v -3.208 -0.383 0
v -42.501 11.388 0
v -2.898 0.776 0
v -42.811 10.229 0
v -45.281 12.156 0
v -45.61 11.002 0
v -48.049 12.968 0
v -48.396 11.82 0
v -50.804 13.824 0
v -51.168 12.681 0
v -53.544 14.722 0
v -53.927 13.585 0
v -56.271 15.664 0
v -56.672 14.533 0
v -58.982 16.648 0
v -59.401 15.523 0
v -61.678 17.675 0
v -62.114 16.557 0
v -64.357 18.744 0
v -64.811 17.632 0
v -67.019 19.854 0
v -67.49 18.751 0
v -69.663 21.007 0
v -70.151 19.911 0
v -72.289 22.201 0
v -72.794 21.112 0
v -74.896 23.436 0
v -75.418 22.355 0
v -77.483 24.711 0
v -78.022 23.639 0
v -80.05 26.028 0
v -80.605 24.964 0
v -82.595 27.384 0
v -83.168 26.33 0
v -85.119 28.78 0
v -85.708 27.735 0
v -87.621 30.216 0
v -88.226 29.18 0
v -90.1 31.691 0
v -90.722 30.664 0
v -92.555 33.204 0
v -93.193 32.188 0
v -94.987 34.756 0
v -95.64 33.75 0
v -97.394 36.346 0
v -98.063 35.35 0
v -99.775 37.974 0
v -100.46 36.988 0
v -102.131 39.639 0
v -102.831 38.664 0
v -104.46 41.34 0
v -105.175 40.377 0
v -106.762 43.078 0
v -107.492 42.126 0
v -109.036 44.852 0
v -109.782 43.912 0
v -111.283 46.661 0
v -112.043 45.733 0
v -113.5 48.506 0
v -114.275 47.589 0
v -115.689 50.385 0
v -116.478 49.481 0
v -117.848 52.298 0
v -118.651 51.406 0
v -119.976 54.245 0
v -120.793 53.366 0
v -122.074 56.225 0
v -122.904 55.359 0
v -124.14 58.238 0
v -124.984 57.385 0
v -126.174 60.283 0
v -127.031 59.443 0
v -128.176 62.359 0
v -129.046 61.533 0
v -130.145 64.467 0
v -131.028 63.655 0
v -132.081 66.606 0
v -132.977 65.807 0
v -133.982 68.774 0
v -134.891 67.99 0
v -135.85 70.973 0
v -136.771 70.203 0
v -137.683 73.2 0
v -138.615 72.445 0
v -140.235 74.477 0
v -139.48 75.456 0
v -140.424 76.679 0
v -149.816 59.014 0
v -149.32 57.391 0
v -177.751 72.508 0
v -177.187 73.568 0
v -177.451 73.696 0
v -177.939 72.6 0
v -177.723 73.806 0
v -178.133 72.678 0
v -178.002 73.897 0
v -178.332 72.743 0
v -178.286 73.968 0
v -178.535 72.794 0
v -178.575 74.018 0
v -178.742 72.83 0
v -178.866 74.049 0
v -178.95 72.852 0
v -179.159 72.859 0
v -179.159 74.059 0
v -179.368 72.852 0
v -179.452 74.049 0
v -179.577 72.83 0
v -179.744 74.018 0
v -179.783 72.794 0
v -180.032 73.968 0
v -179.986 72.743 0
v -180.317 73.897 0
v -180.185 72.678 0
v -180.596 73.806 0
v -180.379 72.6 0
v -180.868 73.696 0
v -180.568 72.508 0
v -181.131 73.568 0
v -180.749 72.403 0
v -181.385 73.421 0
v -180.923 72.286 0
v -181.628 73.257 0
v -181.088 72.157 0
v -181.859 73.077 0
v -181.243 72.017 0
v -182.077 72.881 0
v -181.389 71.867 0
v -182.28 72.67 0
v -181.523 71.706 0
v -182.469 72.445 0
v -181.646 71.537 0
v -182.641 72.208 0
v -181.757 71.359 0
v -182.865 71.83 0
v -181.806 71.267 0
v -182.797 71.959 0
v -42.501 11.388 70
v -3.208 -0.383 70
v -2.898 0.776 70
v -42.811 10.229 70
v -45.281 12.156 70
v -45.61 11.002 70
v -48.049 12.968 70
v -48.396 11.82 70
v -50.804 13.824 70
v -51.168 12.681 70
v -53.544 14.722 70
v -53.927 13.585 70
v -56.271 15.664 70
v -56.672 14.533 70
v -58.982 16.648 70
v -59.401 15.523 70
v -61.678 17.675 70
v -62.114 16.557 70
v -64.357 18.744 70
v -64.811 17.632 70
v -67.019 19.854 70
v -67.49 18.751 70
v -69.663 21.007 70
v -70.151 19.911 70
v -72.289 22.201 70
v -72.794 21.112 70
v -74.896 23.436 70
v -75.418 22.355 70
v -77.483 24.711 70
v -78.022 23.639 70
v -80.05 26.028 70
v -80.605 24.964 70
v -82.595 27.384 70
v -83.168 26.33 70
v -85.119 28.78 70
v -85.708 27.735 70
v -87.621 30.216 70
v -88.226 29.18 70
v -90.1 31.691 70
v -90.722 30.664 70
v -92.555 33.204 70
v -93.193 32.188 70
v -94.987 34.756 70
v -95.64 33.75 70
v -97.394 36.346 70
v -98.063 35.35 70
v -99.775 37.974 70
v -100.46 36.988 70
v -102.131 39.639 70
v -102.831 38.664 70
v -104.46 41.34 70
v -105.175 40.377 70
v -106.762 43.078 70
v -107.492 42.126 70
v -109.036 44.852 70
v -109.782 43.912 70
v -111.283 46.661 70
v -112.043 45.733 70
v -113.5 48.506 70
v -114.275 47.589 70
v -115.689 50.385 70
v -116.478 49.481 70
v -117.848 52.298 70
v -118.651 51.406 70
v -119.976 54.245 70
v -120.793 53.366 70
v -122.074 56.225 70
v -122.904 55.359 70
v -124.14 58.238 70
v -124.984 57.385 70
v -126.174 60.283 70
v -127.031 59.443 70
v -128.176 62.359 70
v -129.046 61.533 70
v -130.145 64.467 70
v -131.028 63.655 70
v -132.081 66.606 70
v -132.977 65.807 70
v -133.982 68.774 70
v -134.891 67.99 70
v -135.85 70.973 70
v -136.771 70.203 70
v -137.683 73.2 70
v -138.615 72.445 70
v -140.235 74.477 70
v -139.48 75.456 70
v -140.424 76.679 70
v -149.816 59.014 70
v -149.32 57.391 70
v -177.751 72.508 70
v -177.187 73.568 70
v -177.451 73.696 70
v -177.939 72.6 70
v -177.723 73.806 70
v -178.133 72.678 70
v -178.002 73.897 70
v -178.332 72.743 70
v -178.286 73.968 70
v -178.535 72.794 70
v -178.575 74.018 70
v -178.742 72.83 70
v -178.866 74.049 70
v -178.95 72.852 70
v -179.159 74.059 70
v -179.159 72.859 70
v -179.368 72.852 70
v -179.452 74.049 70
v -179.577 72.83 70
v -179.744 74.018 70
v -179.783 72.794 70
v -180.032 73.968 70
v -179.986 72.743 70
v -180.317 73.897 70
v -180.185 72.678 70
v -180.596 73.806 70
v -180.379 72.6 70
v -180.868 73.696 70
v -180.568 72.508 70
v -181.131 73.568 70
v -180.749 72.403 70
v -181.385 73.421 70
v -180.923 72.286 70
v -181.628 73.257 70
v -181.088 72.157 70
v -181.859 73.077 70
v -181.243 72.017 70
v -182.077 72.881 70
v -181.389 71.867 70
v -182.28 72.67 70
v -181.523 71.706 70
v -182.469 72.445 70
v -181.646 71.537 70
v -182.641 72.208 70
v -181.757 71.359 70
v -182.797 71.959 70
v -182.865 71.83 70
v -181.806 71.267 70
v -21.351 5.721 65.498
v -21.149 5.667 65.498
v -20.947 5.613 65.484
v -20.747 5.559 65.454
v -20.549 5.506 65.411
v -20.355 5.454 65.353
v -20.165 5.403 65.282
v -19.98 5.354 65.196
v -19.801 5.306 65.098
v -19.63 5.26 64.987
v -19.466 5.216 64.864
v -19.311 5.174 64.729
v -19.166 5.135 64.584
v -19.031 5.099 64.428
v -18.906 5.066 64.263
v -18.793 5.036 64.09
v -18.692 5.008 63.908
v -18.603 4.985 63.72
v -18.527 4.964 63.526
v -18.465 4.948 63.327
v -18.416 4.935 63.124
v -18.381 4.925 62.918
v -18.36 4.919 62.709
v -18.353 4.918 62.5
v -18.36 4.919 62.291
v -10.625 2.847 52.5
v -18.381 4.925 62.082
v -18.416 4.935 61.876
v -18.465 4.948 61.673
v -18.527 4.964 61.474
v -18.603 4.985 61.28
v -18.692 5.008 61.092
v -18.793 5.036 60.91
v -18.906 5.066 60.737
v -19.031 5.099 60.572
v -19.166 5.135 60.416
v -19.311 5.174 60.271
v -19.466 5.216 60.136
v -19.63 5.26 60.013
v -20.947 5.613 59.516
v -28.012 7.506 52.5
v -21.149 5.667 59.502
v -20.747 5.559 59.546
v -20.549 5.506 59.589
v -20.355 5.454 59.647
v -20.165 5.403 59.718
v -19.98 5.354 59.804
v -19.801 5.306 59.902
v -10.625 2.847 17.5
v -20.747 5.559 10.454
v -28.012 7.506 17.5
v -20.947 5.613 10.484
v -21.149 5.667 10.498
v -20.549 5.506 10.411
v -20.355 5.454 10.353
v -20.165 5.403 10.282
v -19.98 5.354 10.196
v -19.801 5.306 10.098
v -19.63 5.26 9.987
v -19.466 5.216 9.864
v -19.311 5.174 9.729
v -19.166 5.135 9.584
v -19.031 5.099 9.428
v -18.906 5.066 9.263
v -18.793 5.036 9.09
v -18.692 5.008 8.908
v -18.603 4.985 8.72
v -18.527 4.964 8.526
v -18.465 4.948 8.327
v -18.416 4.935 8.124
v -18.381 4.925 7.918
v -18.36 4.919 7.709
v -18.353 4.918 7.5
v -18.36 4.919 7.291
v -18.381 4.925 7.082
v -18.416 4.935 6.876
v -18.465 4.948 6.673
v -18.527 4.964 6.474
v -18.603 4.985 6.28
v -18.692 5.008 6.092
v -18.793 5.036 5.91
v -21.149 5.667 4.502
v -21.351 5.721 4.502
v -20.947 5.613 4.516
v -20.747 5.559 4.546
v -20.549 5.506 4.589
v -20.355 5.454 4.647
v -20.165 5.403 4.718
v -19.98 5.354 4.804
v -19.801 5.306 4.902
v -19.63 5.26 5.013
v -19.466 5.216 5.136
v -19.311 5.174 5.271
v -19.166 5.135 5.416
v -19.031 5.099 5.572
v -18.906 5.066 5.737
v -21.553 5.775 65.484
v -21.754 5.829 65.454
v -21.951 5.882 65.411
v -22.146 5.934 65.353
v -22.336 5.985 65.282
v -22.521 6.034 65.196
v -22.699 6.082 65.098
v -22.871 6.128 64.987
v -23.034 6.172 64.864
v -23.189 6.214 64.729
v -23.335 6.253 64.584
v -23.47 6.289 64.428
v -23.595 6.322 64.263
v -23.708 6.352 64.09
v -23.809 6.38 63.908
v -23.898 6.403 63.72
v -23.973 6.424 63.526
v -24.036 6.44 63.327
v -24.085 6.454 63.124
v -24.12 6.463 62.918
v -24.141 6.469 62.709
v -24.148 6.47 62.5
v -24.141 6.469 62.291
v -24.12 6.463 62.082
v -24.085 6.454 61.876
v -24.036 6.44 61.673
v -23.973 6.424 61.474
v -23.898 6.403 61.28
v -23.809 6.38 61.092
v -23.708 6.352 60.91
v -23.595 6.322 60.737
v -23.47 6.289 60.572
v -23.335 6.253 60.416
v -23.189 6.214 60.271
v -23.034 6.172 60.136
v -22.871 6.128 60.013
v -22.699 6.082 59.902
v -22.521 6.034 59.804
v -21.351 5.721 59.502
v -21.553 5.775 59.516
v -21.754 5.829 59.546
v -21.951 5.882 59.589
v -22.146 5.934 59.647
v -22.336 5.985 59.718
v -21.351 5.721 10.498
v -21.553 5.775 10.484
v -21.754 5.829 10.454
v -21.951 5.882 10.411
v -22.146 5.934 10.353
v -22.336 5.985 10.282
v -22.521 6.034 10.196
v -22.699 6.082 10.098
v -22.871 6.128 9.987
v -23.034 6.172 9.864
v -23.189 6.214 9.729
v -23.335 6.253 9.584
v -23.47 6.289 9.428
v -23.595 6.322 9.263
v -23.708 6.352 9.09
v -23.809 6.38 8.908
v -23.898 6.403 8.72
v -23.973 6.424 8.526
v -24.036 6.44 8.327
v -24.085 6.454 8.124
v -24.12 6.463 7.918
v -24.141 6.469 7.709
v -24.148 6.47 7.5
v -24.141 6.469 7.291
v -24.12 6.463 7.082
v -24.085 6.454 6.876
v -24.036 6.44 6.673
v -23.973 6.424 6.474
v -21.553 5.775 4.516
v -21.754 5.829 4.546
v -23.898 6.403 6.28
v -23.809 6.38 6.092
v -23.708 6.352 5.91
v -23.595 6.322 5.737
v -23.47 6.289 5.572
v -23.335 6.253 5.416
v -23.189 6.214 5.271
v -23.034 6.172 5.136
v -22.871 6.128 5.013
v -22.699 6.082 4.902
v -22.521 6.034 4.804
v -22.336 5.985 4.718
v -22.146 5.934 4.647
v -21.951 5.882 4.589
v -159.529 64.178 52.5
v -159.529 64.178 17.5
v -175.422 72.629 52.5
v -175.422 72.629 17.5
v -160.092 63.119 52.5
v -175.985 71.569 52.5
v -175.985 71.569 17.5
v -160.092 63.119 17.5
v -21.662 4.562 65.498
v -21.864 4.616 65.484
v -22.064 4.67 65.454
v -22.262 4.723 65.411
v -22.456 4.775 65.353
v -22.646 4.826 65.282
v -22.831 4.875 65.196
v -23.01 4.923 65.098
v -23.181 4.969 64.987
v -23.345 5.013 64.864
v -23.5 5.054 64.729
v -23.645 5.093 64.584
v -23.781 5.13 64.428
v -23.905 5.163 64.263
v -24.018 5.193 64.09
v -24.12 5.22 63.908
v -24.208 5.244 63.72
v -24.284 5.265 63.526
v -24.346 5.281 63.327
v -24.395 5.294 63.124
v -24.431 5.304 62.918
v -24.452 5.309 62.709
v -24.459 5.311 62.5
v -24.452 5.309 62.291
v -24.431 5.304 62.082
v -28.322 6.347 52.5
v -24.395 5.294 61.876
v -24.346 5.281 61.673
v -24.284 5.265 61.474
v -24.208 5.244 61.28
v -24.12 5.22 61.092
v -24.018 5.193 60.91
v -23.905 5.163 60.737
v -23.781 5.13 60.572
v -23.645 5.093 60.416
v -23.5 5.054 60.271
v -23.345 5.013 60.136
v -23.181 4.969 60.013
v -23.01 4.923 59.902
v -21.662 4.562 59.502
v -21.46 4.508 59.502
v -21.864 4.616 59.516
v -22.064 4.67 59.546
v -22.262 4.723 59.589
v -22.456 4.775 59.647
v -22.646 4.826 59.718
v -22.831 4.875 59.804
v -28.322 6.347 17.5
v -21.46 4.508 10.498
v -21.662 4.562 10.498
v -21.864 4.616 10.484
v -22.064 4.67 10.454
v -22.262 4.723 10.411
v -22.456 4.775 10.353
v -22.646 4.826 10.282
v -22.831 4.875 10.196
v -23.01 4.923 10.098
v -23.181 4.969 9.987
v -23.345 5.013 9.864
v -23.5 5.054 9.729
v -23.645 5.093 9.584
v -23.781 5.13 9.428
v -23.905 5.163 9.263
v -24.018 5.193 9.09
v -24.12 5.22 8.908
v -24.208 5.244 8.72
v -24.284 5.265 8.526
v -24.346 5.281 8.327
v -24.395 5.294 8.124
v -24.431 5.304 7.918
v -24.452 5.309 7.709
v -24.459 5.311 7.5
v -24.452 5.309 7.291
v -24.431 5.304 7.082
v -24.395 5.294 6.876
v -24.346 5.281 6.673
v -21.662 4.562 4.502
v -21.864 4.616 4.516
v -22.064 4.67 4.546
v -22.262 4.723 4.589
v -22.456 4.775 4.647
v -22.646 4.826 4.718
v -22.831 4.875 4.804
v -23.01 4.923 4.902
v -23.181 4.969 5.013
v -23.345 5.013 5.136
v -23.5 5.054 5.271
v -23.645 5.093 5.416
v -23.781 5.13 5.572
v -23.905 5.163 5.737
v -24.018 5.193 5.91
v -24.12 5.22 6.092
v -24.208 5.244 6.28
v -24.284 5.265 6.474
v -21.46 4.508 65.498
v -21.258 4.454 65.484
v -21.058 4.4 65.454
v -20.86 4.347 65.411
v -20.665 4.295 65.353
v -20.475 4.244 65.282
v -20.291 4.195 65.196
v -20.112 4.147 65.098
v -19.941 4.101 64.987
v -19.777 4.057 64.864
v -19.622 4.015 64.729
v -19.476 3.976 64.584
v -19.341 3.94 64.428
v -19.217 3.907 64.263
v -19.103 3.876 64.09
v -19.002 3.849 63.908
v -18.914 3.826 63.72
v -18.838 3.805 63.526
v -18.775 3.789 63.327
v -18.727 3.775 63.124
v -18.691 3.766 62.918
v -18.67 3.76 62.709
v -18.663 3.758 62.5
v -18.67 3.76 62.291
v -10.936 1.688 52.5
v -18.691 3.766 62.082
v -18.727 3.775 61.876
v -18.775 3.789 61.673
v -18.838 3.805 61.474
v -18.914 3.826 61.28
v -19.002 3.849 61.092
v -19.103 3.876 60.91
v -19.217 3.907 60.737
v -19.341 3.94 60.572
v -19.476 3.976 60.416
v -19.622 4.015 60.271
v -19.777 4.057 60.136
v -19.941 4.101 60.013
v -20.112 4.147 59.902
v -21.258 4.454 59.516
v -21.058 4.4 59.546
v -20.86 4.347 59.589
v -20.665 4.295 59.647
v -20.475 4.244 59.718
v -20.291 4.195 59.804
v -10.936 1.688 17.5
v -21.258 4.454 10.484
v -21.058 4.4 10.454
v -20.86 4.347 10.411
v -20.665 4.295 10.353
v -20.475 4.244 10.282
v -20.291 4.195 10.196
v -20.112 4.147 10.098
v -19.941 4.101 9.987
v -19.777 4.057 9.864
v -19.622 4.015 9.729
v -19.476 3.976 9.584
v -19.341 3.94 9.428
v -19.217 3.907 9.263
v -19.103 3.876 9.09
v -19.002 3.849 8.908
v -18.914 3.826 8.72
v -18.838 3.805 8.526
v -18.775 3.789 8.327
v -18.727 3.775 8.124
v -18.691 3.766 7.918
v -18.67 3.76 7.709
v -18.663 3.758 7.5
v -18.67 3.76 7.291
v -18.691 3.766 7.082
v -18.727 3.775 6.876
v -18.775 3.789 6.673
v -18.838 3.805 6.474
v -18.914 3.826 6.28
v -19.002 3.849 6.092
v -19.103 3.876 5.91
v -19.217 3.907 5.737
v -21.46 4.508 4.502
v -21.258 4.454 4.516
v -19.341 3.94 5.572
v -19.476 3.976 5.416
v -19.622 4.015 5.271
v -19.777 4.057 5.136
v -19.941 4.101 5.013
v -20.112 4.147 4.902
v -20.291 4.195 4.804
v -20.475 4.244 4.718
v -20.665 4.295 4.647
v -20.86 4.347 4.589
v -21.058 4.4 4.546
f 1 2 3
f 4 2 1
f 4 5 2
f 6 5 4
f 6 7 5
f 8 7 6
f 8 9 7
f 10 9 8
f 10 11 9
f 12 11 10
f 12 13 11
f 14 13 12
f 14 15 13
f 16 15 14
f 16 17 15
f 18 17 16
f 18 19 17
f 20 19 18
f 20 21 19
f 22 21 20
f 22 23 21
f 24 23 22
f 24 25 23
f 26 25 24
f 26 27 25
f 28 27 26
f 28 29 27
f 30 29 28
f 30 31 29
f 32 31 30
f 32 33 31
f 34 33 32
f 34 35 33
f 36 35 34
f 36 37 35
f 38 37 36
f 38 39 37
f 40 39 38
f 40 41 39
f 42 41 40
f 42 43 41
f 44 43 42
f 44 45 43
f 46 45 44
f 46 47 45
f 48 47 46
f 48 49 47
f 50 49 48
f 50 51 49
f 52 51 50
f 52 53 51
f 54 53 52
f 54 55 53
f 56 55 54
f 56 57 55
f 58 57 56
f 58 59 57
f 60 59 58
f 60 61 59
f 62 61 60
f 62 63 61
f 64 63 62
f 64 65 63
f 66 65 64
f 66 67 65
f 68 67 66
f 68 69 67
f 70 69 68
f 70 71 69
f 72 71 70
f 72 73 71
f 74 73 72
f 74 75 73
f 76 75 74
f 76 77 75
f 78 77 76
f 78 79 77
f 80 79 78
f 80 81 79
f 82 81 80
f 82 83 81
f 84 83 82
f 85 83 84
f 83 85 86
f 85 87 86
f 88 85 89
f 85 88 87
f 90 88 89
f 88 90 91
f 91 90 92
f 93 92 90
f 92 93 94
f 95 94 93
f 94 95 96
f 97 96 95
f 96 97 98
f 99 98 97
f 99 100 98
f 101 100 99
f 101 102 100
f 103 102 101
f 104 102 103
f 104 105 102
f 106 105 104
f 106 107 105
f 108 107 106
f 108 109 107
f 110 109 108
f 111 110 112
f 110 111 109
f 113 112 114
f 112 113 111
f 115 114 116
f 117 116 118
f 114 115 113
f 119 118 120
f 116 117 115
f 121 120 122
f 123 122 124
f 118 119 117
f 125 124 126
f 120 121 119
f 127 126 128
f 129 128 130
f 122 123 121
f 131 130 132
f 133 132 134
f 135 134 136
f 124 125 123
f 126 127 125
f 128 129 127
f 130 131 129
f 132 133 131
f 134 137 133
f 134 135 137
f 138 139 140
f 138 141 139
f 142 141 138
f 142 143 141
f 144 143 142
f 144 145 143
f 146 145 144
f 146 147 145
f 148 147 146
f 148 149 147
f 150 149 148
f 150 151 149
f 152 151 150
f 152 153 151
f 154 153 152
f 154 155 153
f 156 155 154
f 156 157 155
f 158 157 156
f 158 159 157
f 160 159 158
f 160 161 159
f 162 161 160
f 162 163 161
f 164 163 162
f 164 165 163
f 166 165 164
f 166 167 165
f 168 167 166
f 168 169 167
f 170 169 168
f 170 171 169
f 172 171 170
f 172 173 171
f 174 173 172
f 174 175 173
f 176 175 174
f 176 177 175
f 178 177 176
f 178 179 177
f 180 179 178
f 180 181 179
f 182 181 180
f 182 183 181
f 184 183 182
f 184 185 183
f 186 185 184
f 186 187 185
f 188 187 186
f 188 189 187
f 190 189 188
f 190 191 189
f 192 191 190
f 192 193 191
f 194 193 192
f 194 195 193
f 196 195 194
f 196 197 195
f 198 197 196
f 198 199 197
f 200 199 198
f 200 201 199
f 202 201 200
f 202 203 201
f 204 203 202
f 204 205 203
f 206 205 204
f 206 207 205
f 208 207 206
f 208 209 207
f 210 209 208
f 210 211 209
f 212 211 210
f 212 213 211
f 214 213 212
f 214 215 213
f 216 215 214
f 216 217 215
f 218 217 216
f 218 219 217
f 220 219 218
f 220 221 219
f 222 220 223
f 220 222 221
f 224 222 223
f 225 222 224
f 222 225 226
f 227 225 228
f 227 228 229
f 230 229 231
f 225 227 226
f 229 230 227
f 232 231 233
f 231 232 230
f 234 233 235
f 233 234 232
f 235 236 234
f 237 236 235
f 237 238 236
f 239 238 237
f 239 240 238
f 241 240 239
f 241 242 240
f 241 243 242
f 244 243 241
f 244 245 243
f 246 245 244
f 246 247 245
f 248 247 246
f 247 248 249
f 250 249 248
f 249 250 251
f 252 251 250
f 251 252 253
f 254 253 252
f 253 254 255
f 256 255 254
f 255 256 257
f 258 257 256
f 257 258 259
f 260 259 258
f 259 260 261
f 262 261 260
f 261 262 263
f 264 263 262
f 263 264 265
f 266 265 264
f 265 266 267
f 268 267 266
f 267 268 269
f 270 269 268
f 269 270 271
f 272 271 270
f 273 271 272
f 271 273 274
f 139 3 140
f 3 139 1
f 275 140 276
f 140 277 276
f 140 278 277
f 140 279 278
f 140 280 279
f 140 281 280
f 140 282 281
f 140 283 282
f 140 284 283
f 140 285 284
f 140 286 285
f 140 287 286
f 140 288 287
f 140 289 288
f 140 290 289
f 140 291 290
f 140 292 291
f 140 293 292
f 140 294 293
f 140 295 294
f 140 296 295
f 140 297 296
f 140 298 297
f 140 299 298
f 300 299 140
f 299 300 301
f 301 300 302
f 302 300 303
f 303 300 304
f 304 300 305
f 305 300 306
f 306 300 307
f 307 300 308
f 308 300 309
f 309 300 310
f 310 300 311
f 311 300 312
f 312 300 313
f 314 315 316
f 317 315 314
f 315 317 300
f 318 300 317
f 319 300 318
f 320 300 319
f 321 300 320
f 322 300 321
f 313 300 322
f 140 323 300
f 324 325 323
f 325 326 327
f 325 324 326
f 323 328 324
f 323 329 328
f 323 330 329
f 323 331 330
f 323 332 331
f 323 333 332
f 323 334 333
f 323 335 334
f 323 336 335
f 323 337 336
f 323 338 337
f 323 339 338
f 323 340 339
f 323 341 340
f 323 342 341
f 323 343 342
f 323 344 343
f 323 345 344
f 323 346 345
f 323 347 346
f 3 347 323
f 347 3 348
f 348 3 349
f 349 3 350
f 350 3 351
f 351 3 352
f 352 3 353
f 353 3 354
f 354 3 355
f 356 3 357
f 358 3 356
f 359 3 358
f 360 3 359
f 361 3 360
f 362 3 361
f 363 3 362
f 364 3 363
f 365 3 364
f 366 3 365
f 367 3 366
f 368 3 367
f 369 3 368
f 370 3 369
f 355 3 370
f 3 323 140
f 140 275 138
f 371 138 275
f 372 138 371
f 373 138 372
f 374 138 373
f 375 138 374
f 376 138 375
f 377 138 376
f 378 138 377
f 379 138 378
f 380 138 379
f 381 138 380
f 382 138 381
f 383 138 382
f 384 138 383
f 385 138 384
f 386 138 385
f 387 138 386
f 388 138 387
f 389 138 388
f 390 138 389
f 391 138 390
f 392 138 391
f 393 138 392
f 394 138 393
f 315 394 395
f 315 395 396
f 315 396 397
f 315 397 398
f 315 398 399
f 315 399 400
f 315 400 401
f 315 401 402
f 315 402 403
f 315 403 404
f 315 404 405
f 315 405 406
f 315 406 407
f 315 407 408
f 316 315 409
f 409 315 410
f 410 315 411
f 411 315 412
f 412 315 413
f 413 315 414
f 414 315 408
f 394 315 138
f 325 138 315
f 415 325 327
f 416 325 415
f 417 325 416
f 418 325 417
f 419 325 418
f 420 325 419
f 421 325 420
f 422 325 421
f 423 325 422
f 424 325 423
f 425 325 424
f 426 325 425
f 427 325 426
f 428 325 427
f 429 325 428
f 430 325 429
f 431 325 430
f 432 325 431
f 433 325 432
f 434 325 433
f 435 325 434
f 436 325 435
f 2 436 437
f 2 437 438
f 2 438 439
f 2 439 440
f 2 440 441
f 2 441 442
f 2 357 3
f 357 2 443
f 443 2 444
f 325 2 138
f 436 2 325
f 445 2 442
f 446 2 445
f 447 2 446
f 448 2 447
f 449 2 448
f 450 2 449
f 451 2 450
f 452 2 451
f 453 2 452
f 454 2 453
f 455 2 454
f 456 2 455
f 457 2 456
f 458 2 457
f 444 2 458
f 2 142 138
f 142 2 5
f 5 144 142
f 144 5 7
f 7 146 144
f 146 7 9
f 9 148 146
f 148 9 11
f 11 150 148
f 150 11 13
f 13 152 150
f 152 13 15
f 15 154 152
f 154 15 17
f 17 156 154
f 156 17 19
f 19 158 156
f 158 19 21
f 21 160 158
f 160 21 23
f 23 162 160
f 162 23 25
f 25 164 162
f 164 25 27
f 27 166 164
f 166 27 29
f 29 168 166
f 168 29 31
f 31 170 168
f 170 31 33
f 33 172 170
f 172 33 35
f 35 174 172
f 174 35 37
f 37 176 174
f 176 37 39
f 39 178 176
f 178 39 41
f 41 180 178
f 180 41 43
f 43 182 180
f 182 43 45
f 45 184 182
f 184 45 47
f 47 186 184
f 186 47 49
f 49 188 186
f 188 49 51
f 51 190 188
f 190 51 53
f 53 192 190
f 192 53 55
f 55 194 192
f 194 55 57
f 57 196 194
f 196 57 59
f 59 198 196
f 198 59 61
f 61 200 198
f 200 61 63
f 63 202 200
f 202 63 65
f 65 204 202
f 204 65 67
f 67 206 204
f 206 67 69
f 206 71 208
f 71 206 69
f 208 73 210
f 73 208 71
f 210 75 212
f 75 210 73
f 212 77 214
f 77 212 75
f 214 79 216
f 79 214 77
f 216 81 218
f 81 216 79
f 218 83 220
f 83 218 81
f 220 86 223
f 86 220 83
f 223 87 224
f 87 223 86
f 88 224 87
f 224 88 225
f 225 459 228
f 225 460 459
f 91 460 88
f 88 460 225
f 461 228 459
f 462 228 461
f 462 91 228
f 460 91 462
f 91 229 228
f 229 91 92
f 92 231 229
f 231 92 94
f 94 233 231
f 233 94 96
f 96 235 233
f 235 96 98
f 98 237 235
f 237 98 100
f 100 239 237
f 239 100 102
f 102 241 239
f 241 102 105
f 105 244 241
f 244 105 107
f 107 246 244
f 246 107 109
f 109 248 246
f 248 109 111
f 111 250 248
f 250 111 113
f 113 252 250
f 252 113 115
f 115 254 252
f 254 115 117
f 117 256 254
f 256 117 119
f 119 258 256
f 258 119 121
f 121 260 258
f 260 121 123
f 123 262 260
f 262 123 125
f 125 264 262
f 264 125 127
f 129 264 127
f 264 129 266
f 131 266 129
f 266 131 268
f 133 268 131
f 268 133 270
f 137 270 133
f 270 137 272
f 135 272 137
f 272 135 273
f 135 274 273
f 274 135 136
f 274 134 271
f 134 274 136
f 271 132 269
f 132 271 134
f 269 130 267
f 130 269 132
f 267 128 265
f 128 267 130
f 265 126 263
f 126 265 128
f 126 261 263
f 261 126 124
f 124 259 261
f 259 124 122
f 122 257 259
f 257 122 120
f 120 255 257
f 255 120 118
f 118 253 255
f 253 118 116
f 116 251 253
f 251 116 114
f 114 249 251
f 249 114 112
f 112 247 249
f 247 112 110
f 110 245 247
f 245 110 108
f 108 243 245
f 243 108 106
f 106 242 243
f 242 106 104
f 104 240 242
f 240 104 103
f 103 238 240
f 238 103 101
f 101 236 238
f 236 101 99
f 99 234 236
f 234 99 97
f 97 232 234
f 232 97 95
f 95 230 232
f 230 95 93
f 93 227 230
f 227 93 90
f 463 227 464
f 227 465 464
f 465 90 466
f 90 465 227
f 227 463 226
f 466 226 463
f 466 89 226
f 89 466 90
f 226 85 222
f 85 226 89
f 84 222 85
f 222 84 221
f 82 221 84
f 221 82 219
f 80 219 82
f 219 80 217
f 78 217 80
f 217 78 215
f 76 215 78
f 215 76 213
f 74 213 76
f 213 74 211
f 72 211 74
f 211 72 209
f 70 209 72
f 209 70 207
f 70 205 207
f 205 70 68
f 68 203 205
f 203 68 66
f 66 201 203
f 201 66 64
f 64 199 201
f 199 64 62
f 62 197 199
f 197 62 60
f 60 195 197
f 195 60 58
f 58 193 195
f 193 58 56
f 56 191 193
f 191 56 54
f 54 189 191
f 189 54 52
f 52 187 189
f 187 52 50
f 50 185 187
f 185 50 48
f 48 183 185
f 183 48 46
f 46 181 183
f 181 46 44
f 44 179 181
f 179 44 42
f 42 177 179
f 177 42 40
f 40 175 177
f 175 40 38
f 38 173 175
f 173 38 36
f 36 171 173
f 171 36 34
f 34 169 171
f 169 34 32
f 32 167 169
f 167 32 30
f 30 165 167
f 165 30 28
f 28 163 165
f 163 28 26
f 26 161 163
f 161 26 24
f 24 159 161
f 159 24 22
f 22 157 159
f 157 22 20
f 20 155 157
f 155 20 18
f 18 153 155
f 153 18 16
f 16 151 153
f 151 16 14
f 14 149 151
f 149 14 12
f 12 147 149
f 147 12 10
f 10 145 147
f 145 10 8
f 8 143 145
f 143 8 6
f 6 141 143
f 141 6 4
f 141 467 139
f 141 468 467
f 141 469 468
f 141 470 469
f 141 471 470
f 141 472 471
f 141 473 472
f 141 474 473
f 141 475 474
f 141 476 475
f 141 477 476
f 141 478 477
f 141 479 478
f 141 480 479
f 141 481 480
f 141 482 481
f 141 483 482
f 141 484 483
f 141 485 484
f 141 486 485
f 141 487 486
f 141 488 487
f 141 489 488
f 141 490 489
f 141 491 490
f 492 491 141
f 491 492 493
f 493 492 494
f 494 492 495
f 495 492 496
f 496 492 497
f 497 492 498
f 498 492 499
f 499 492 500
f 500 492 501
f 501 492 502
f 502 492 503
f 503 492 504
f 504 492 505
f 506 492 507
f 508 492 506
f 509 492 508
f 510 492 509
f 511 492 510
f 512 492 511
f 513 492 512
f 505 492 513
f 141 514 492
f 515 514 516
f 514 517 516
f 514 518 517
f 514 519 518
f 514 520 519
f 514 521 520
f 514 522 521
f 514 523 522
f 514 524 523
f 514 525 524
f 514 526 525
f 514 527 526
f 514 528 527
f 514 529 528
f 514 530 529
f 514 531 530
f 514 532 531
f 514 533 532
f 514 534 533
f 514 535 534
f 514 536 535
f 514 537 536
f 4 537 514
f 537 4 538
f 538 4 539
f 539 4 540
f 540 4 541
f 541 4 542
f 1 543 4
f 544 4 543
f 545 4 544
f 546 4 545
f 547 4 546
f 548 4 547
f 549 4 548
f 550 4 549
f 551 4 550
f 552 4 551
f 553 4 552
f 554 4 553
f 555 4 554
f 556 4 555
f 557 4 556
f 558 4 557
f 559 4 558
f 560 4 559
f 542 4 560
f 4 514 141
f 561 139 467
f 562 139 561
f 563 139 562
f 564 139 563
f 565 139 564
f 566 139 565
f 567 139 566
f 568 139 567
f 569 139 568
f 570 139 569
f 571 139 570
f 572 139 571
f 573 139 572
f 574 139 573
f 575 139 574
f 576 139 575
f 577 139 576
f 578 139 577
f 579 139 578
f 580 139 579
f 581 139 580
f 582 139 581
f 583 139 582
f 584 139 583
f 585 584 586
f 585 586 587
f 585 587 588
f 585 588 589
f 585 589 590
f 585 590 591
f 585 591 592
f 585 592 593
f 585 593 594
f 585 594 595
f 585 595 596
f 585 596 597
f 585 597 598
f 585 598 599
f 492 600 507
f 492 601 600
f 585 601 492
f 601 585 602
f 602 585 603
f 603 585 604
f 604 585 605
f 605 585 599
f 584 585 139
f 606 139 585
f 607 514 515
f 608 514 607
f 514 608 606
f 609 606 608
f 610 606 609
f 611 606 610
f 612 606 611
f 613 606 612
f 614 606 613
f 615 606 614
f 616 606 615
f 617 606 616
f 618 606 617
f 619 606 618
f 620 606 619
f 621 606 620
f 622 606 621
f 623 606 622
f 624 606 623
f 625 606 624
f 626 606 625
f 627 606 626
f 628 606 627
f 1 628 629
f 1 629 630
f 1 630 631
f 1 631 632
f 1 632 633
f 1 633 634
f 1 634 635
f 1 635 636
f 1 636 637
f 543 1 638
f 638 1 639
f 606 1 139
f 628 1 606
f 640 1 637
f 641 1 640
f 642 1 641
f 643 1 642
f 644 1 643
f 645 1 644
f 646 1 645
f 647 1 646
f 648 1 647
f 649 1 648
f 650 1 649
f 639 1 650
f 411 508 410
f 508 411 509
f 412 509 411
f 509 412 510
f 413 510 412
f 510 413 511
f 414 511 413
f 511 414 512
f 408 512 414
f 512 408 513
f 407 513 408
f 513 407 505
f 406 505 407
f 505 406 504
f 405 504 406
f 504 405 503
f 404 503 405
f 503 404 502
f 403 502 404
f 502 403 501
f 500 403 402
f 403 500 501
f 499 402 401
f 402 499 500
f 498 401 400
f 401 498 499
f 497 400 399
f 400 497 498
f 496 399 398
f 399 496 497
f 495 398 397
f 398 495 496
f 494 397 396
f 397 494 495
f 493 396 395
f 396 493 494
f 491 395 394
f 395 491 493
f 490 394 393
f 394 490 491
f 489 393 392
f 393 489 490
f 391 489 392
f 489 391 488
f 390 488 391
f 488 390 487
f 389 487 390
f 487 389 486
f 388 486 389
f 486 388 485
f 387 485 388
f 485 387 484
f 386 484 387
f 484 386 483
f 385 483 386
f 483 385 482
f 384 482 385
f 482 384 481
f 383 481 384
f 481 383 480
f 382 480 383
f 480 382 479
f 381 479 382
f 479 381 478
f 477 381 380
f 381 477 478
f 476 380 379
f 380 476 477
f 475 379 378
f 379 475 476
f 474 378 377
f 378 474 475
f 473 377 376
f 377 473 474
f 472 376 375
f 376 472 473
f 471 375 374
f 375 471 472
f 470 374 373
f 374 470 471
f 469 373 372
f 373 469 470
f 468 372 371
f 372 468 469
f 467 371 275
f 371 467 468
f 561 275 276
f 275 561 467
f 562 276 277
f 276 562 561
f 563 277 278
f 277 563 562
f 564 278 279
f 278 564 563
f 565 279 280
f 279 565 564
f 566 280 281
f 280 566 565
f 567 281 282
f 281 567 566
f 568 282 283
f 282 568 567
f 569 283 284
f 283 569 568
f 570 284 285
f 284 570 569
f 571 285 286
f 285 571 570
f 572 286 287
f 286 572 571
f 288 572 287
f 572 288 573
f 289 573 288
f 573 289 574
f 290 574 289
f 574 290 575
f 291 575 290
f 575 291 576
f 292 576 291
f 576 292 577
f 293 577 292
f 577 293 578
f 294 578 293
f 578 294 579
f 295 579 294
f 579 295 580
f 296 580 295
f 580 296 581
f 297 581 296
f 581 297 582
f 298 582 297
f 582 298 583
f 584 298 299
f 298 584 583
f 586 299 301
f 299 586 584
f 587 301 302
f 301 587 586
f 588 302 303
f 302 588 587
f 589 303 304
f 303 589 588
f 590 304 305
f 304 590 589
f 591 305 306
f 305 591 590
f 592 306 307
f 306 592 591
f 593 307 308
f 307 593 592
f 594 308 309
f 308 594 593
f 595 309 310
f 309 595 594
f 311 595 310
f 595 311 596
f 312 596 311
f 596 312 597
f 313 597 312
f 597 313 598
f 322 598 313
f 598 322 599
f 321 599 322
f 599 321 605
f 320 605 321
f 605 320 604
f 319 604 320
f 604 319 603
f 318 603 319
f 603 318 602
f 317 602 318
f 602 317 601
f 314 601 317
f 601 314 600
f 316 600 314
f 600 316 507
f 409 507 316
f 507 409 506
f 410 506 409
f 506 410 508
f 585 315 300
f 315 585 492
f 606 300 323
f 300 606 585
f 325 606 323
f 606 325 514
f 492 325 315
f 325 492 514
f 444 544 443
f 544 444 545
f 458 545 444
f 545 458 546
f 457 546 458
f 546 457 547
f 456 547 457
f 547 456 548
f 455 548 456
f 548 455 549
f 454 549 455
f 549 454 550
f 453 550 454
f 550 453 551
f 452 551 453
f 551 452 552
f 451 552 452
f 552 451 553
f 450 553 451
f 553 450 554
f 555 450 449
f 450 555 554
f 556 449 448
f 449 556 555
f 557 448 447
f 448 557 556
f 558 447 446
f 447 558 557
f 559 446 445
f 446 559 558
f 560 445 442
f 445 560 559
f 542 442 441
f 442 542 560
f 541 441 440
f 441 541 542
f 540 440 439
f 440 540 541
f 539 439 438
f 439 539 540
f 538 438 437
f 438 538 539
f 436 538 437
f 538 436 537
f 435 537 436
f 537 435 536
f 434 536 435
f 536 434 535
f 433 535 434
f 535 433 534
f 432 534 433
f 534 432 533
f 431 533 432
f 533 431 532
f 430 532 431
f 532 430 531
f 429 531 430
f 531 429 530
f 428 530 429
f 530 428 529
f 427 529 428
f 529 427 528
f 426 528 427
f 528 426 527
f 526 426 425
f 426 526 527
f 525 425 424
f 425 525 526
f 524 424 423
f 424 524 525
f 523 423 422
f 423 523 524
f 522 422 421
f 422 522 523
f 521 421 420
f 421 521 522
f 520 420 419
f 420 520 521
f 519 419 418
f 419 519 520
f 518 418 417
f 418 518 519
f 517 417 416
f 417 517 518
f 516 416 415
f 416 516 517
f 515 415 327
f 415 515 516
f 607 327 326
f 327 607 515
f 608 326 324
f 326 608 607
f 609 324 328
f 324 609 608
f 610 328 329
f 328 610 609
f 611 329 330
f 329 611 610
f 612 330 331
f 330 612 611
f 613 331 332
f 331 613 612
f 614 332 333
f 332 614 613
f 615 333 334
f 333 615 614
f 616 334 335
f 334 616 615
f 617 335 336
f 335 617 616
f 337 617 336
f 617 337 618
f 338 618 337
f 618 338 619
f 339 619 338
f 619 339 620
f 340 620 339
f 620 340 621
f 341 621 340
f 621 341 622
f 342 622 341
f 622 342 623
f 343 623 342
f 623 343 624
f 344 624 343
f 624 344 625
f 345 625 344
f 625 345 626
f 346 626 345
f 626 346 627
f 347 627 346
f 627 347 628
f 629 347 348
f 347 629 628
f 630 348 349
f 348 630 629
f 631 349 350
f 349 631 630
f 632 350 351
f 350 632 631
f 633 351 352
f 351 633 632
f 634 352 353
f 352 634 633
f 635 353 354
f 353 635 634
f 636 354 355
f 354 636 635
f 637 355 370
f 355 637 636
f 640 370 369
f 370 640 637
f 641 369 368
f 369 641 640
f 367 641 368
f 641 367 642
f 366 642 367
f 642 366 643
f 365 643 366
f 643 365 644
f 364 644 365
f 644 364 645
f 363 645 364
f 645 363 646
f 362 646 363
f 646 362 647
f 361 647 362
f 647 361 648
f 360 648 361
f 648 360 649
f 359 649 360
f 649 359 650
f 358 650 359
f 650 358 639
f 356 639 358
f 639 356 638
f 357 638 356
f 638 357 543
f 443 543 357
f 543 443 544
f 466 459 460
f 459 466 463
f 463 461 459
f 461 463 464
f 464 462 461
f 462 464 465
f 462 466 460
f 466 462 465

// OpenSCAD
// file: ../src/door_catch.scad
in=25.4;

// how thick is the door?
door_thick=44;


// how wide the door is; makes for cleaner angles
door_width=28*in;

// how far should the door be open?
// distance of gap will be echo'd
//open_angle=(sin($t*360)/2+0.5)*45;
open_angle=13;

// distance to edge, used to place hole
catch=15;

// size of catch hole
catch_x=18;
catch_y=35;

// size of screw holes
screw=6;

// space between screws
// screws are assumed to be centered in door_thick
screw_gap=55;

// space around screw holes if automatically calculating height
screw_wall=4;

// thickness of part
wall=1.2;

//height=screw_gap+screw+screw_wall*2;
height=70;

// size of Z shape that stops the door from closing
latch=in/2;

// extra curve at end of the part to make closing smoother
close_r=3;

// trim off ends to fit printer bed 
//trim_base=14;
trim_base=3;
trim_end=10;

// only used for drawing a preview door
door_h=height;
display_angle=open_angle;


$fn=90;

big_fn=400;

function segment_radius(height, chord) = (height/2)+(chord*chord)/(8*height);

// link to sketch
open_y=sin(open_angle)*door_width;
open_x=door_width-(cos(open_angle)*door_width);
opening=sqrt((pow(open_x,2)+pow((open_y-door_thick),2)));
echo(opening/in);
echo(opening);

// link to sketch
latch_x=door_width-(cos(open_angle)*(door_width-latch));
latch_y=(sin(open_angle)*(door_width-latch))-door_thick;
latch_hyp=sqrt(pow(latch_x,2)+pow(latch_y,2));
latch_angle=atan(latch_y/latch_x);
radius=segment_radius(latch_x,latch_y*2);

module door() {
    translate([door_width,0])
    mirror([1,0,0])
    rotate([0,0,display_angle])
    color("tan")
    cube([door_width,door_thick,door_h]);
}

module profile() {
    translate([-wall,trim_base])
    square([wall,door_thick-trim_base]);
    translate([radius,door_thick])
    difference() {
        circle(r=radius+wall,$fn=big_fn);
        circle(r=radius,$fn=big_fn);

        // cut off botttom 
        translate([-radius-wall,-radius-wall*2])
        square([radius*2+wall*2,radius+wall*2]);

        // top right
        square([radius+wall*2,radius+wall*2]);

        // door
        translate([door_width-radius,-door_thick])
        mirror([1,0,0])
        rotate([0,0,display_angle])
        square([door_width,radius]);
    }
    translate([door_width,0])
    rotate([0,0,-open_angle]) 
    translate([-door_width,0]) {
        translate([-wall,-wall])
        square([latch,wall]);
        translate([-wall,-wall])
        square([wall,door_thick+wall-close_r-trim_end]);
        translate([-wall-close_r,door_thick-close_r-trim_end])
        difference() {
            intersection() {
                circle(r=close_r+wall);
                square([close_r+wall,close_r+wall]);
            }
            circle(r=close_r);
        }
    }
}

module dirror_y() {
    children();
    mirror([0,1])
    children();
}

module catch() {
    translate([door_thick/2-catch_x/2-catch,0])
    square([catch_x,catch_y],center=true);
    children();
}

module screws() {
    dirror_y()
    translate([0,screw_gap/2])
    circle(d=screw);
}

module place_catch(angle=0) {
    translate([door_width,0])
    rotate([0,0,-angle])
    translate([-door_width-wall*2,door_thick/2,height/2])
    rotate([90,0,90])
    linear_extrude(height=wall*3)
    children();
}

module latch() {
    difference() {
        linear_extrude(height=height)
        profile();
        place_catch()
        // uncomment this to allow the door to close
        catch()
        screws();
        place_catch(open_angle)
        catch();
    }
}
// main file
include <../src/door_catch.scad>;

latch=(sin($t*360)/2+0.5)*30+5;

// RENDER gif
module demo() {
    rotate([0,0,75])
    latch();
}

demo();
